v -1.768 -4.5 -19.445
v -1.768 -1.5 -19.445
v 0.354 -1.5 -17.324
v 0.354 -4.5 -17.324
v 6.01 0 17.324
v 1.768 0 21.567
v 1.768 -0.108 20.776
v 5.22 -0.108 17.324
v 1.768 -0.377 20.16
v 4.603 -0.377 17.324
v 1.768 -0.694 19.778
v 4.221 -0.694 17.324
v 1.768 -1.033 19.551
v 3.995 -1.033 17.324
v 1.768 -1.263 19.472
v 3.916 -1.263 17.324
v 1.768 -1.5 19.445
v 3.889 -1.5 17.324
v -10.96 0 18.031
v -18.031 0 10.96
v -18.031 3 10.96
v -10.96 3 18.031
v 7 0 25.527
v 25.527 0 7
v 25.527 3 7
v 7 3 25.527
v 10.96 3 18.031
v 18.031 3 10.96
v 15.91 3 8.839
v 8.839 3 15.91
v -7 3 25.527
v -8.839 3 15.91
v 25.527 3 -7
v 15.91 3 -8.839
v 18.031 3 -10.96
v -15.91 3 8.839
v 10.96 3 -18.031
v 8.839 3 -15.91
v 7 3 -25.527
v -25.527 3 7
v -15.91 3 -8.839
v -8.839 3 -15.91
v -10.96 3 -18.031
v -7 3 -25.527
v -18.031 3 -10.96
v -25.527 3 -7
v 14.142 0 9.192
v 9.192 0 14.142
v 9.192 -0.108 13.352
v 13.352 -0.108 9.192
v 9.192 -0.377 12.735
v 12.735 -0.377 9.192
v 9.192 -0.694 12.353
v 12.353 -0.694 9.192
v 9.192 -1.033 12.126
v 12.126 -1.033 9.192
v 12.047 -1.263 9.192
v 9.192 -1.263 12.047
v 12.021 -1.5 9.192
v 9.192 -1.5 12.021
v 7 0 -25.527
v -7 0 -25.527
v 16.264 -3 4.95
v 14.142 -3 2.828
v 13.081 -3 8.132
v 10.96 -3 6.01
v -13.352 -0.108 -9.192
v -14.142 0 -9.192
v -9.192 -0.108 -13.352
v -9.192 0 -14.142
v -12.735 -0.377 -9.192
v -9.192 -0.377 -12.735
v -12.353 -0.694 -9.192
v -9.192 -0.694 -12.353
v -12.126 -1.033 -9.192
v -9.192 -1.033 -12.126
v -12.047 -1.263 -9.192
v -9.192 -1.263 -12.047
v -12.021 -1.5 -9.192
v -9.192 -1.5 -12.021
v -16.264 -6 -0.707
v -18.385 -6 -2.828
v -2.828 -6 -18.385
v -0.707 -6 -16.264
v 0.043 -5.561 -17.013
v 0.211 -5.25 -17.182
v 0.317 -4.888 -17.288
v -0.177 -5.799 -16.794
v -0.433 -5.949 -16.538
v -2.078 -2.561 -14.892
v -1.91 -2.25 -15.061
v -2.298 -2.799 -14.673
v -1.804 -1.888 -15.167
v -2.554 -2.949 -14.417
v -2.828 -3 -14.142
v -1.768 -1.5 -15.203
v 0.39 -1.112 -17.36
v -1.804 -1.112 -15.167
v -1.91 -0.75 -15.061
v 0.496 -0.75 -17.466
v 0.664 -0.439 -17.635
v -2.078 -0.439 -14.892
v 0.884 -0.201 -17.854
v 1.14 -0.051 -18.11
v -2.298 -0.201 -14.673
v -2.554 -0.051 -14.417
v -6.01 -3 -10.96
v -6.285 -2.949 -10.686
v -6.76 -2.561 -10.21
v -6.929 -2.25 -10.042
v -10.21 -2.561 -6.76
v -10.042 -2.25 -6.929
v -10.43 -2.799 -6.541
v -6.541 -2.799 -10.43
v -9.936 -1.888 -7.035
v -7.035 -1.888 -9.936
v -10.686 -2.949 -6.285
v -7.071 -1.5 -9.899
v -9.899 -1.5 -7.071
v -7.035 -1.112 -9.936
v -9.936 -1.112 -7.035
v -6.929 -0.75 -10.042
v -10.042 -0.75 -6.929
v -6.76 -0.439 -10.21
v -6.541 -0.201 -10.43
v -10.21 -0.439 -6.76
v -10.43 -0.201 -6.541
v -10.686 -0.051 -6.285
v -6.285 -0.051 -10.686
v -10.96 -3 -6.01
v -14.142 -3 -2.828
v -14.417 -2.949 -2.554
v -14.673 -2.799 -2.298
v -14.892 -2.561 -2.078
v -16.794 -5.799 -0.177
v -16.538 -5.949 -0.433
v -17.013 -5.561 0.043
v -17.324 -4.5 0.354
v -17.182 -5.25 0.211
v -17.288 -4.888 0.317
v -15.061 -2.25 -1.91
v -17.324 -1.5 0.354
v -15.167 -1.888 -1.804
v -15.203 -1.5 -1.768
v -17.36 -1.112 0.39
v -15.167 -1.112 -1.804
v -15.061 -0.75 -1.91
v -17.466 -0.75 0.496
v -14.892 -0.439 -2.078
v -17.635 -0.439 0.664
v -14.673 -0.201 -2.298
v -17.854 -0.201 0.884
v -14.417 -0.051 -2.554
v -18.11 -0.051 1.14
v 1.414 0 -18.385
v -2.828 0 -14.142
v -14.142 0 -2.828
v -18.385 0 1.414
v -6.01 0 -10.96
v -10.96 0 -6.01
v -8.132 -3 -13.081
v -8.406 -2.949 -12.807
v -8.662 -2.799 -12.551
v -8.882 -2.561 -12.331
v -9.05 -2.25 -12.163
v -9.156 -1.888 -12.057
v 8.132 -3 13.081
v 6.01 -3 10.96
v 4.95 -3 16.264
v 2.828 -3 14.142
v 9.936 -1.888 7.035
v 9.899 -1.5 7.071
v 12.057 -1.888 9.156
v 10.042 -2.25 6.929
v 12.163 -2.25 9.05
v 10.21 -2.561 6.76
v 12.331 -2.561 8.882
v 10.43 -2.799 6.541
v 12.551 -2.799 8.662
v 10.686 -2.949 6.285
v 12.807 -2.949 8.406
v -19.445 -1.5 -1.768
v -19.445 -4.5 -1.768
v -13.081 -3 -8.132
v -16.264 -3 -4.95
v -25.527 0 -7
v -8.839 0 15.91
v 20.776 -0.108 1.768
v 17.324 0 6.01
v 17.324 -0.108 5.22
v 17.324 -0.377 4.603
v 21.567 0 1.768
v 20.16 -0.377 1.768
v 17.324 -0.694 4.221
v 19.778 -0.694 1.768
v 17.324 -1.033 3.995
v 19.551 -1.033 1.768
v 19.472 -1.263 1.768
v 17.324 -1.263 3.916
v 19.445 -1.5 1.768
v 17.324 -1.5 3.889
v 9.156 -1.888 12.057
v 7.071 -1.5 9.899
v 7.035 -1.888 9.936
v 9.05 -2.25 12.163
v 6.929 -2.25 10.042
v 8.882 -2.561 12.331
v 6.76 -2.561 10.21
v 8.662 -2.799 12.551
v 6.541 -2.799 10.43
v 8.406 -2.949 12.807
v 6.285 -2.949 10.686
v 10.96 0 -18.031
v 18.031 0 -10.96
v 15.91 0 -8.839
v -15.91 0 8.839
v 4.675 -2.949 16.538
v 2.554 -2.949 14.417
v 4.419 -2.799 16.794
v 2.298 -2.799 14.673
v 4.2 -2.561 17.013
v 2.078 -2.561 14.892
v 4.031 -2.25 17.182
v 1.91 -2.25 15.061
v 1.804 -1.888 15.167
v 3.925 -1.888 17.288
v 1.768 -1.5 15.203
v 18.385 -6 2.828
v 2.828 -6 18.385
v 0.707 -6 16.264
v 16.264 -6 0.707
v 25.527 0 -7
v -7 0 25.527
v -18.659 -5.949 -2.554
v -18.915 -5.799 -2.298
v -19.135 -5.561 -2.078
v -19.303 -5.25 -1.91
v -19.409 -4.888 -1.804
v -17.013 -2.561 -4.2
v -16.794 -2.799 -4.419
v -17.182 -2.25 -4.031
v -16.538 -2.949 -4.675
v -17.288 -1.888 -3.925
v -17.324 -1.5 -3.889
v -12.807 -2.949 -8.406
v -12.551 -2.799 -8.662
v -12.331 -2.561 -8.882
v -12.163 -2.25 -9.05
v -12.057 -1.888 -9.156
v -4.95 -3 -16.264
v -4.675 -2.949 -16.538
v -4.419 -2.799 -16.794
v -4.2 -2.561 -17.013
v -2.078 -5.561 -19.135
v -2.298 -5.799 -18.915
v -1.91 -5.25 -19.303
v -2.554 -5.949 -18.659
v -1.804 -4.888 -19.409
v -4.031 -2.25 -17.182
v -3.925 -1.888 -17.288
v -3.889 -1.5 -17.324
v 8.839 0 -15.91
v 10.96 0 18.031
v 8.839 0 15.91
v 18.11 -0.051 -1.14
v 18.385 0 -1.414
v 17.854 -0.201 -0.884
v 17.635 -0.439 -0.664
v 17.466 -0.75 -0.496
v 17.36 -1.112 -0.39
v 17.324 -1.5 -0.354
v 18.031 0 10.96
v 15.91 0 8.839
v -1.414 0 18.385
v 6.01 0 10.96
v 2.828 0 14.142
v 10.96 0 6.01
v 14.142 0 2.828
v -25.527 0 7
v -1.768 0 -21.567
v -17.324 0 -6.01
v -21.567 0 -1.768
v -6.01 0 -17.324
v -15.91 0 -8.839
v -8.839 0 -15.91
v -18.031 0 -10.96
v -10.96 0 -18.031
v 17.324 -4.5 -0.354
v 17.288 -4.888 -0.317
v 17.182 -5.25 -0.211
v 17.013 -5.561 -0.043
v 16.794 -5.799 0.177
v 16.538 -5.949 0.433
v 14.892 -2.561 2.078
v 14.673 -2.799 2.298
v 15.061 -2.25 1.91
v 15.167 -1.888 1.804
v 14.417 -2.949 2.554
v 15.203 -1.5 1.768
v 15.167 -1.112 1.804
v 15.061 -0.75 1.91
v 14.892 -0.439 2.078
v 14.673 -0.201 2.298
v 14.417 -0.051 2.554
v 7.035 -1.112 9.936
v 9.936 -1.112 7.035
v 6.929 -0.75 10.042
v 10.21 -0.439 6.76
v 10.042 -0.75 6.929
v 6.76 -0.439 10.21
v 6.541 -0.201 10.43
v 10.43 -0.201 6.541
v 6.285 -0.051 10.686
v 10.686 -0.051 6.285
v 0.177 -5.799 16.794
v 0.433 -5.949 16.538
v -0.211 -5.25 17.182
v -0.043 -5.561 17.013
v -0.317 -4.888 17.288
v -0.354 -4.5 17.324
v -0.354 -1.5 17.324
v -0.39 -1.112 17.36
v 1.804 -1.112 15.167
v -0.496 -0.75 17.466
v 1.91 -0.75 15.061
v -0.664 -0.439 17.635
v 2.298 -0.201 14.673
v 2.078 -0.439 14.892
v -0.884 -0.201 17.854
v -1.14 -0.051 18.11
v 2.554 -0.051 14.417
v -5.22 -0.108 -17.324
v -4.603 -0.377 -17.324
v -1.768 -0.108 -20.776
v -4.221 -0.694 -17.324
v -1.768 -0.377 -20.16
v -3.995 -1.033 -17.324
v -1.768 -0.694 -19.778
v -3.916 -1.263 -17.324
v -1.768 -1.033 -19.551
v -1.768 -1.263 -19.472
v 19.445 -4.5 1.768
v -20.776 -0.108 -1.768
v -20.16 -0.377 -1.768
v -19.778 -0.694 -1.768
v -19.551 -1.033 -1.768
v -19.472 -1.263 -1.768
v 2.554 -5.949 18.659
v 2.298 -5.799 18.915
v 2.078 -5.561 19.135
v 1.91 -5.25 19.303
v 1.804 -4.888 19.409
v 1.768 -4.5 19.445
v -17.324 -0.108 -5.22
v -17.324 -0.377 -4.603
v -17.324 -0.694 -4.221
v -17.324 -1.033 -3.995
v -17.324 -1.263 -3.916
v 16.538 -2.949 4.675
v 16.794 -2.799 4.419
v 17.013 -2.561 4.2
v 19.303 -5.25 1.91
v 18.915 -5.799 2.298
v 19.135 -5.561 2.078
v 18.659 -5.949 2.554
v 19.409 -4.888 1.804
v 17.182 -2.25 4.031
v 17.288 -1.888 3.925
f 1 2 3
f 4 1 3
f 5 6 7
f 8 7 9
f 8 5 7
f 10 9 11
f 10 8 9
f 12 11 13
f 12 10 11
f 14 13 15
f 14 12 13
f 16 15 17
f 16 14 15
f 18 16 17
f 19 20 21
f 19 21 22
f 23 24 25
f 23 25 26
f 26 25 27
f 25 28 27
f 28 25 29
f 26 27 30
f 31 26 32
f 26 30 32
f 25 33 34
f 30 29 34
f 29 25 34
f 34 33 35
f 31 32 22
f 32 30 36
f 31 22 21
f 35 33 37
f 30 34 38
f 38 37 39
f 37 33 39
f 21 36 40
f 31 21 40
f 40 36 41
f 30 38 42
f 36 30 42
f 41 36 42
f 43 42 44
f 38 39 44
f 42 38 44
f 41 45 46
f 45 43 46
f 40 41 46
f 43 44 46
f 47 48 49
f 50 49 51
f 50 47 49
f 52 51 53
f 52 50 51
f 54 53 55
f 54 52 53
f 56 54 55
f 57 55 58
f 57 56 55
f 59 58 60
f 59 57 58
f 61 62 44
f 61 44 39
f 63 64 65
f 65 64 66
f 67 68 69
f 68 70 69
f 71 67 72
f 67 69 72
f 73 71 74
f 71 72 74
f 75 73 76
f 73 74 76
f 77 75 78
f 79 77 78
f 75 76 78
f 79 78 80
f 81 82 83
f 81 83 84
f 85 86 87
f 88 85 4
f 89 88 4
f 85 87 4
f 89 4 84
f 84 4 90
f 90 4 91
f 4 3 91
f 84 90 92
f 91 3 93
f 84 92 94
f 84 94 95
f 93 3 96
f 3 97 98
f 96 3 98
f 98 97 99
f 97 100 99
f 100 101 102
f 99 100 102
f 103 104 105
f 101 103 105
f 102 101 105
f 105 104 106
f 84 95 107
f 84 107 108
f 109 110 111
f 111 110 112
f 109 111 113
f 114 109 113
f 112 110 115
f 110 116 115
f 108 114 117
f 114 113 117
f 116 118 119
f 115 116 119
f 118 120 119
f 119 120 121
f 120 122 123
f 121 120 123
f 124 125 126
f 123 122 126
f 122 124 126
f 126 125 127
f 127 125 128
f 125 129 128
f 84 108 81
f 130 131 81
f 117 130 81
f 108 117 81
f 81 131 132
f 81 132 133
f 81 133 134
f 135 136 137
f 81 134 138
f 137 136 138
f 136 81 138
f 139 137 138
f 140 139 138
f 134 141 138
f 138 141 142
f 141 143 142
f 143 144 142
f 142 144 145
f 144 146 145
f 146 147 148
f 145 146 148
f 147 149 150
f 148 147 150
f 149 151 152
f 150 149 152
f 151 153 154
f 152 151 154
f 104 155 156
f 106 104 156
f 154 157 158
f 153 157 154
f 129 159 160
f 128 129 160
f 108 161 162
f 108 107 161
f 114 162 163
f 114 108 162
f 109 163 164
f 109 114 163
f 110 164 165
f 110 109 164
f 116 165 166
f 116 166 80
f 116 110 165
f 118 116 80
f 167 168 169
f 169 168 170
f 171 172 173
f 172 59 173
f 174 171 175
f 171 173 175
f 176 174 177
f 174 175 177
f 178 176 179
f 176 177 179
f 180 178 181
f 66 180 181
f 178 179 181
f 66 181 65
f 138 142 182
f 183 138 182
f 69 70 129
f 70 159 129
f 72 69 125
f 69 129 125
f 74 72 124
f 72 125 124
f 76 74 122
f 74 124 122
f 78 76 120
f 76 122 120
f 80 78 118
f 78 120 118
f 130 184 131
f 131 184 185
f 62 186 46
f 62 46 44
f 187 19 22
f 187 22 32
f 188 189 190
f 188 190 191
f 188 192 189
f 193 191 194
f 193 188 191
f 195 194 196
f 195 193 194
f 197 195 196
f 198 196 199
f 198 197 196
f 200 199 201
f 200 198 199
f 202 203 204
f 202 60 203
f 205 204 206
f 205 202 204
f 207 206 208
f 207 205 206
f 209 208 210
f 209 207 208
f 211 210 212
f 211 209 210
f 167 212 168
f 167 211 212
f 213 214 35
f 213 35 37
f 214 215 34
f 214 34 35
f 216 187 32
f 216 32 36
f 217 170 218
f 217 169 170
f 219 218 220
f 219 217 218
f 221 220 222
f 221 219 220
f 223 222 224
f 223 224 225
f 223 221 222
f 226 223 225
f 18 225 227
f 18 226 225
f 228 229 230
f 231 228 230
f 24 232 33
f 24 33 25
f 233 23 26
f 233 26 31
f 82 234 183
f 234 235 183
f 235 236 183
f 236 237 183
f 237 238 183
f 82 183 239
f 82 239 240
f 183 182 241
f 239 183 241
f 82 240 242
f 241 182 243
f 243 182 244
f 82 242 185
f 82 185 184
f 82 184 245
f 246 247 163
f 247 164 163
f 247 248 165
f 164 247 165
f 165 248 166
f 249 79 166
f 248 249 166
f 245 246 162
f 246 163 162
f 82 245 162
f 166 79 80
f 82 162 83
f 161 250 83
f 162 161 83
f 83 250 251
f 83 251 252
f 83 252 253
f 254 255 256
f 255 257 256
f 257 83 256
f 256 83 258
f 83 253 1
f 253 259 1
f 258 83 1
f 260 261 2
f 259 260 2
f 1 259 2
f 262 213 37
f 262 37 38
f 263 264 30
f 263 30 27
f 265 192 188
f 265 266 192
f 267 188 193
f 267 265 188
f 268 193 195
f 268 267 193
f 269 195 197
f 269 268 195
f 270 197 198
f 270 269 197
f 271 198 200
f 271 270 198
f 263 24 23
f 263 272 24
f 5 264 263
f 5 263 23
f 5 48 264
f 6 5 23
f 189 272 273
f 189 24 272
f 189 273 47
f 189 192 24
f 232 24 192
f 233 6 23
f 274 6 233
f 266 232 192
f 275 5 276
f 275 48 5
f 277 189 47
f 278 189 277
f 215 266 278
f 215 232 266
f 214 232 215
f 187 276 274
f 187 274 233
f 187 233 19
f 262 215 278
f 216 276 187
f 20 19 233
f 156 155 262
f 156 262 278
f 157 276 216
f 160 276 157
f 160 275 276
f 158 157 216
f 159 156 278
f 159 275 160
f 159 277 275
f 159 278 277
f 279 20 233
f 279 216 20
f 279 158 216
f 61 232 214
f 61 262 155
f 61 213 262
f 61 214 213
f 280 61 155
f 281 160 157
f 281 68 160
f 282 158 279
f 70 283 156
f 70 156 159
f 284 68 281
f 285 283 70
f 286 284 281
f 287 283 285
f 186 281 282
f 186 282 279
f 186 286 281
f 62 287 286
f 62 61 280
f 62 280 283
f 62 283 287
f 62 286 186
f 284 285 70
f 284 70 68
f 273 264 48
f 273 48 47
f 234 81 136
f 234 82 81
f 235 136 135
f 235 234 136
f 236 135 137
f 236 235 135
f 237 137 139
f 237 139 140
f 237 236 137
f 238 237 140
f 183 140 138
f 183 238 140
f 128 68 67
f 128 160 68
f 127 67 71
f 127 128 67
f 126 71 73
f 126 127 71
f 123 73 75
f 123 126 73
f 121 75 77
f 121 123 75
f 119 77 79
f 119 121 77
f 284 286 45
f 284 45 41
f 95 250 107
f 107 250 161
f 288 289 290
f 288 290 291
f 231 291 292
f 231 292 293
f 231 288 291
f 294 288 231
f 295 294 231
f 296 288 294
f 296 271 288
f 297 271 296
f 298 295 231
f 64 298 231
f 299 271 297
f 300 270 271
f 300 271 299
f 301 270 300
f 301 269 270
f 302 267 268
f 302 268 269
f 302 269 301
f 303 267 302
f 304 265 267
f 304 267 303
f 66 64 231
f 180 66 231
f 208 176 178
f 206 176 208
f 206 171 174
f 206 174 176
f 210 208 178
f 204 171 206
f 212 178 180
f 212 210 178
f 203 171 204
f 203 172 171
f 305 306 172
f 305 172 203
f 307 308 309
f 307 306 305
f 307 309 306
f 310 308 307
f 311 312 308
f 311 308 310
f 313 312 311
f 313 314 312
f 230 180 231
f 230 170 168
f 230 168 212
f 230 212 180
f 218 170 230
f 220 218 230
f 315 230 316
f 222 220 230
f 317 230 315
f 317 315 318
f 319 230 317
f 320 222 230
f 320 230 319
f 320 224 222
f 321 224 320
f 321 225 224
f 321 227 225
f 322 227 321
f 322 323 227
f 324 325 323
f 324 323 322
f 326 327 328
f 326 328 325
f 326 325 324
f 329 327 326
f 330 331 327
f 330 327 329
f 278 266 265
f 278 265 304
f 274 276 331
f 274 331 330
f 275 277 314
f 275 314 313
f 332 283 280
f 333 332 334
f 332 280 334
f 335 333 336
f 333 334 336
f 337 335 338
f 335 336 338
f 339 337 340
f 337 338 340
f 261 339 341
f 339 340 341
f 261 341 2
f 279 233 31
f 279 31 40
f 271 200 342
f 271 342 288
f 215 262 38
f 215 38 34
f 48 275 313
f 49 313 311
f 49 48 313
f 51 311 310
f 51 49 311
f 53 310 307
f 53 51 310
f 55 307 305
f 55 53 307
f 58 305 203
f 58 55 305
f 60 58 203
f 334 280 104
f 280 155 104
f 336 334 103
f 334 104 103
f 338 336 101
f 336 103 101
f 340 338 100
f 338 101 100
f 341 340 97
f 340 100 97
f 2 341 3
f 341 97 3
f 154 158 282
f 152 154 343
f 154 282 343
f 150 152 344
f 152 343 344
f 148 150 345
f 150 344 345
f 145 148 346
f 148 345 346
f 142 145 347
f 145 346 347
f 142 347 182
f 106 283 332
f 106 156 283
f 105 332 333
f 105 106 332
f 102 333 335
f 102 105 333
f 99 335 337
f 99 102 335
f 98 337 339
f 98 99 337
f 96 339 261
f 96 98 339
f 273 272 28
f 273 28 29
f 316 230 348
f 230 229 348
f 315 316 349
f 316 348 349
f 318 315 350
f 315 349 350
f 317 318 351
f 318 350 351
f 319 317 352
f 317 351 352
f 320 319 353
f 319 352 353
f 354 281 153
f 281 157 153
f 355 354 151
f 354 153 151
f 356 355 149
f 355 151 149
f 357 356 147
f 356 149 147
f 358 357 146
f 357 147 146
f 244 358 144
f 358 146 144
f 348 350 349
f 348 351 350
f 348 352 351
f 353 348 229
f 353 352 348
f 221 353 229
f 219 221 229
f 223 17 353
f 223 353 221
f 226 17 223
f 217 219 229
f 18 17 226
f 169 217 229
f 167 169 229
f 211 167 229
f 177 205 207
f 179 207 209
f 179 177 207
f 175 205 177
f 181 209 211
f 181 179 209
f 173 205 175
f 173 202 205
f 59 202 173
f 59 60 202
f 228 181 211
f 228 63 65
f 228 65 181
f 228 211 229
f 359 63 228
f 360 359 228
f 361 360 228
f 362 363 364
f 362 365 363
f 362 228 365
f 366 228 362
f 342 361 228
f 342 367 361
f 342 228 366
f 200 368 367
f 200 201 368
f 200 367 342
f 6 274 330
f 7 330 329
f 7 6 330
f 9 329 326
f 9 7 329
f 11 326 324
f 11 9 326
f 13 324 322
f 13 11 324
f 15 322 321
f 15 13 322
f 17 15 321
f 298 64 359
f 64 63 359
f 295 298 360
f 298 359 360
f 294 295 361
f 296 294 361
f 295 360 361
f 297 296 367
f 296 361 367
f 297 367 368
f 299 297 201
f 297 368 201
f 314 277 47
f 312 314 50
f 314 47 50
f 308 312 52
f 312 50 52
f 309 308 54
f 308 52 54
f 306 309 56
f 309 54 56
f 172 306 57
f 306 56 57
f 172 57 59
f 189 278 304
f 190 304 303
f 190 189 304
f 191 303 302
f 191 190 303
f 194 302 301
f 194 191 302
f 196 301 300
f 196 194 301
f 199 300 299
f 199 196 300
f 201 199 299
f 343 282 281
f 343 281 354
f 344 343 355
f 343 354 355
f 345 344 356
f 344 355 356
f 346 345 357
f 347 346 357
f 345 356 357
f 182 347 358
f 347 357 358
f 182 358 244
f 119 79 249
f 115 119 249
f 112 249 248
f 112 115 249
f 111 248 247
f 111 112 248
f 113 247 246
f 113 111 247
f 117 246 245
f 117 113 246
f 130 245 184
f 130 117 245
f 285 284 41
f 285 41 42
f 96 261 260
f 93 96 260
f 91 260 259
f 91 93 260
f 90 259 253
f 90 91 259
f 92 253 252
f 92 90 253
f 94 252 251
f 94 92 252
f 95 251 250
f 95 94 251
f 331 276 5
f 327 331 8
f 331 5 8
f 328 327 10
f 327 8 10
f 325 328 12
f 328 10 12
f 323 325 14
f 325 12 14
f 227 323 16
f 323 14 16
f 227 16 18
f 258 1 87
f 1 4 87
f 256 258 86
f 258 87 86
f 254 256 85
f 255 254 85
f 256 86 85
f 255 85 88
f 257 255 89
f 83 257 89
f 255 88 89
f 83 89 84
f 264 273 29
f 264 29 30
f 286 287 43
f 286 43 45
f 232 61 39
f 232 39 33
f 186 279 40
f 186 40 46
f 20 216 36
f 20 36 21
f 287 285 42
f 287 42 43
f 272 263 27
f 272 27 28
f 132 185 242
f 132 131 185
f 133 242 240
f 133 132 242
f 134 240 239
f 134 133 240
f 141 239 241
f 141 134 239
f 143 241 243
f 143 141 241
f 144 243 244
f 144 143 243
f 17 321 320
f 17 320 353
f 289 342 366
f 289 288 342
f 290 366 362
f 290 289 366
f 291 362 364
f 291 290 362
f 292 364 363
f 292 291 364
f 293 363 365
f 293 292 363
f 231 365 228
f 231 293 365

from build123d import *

# Parameters (mm, degrees)
MAIN_PLATE_DEPTH                 = 3
TOP_PLATE_CONNECTOR_HOLES_DEPTH  = 37.224942593
ZIPTIE_STRUCTURE_DEPTH           = 6
SKETCH5_W                        = 7.5
SKETCH5_H                        = 3
ZIPTIE_HOLES_DEPTH               = 52.45154631
REMOVING_STRESS_CONCENTRATIONS_R = 1.5


with BuildPart() as part:
    # Sketch1 → Main Plate (new body)
    with BuildSketch(Plane(origin=(0, 0, 0), x_dir=(1, 0, 0), z_dir=(0, 1, 0))):
        Polygon((-7, 25.526911935), (7, 25.526911935), (25.526911935, 7), (25.526911935, -7), (7, -25.526911935), (-7, -25.526911935), (-25.526911935, -7), (-25.526911935, 7), align=None)
    extrude(amount=MAIN_PLATE_DEPTH)

    # Sketch2 → Top Plate Connector Holes (cut, through all)
    with BuildSketch(Plane.XZ):
        Polygon((10.960155108, 18.03122292), (18.03122292, 10.960155108), (15.909902577, 8.838834765), (8.838834765, 15.909902577), align=None)
        Polygon((8.838834765, -15.909902577), (15.909902577, -8.838834765), (18.03122292, -10.960155108), (10.960155108, -18.03122292), align=None)
        Polygon((-15.909902577, -8.838834765), (-8.838834765, -15.909902577), (-10.960155108, -18.03122292), (-18.03122292, -10.960155108), align=None)
        Polygon((-8.838834765, 15.909902577), (-15.909902577, 8.838834765), (-18.03122292, 10.960155108), (-10.960155108, 18.03122292), align=None)
    extrude(amount=-TOP_PLATE_CONNECTOR_HOLES_DEPTH, mode=Mode.SUBTRACT)

    # Sketch3 → ZipTie Structure (add)
    with BuildSketch(Plane.XZ):
        Polygon((1.767766953, 19.445436483), (19.445436483, 1.767766953), (17.324116139, -0.353553391), (-0.353553391, 17.324116139), align=None)
        Polygon((-1.767766953, -19.445436483), (0.353553391, -17.324116139), (-17.324116139, 0.353553391), (-19.445436483, -1.767766953), align=None)
    extrude(amount=ZIPTIE_STRUCTURE_DEPTH)

    # Sketch5 → ZipTie Holes (cut, through all)
    with BuildSketch(Plane(origin=(-10.606601718, 0, -10.606601718), x_dir=(-0.7071067811865475, 0, 0.7071067811865477), z_dir=(-0.7071067811865477, 0, -0.7071067811865475))):
        with Locations((-5.75, -1.5)):
            Rectangle(SKETCH5_W, SKETCH5_H)
        with Locations((5.75, -1.5)):
            Rectangle(SKETCH5_W, SKETCH5_H)
    extrude(amount=-ZIPTIE_HOLES_DEPTH, mode=Mode.SUBTRACT)

    # Removing Stress Concentrations
    removing_stress_concentrations_edges = [part.edges().sort_by_distance(p)[0] for p in [
        (8.131727984, -3, 10.960155108),
        (10.960155108, -3, 8.131727984),
        (16.263455967, -3, 2.828427125),
        (-2.828427125, -3, -16.263455967),
        (-8.131727984, -3, -10.960155108),
        (-10.960155108, -3, -8.131727984),
        (-16.263455967, -3, -2.828427125),
        (2.828427125, -3, 16.263455967),
        (-16.263455967, 0, -2.828427125),
        (-8.131727984, 0, -10.960155108),
        (-0.707106781, 0, -18.384776311),
        (2.828427125, 0, 18.384776311),
        (10.606601718, 0, 10.606601718),
        (18.384776311, 0, 2.828427125),
        (10.960155108, 0, 8.131727984),
        (2.828427125, 0, 16.263455967),
        (0.707106781, -6, 18.384776311),
        (18.384776311, -6, 0.707106781),
        (18.384776311, 0, 0.707106781),
        (16.263455967, 0, 2.828427125),
        (0.707106781, 0, 18.384776311),
        (8.131727984, 0, 10.960155108),
        (-18.384776311, 0, -0.707106781),
        (-2.828427125, 0, -16.263455967),
        (-10.960155108, 0, -8.131727984),
        (-2.828427125, 0, -18.384776311),
        (-10.606601718, 0, -10.606601718),
        (-18.384776311, 0, -2.828427125),
        (-18.384776311, -6, -0.707106781),
        (-0.707106781, -6, -18.384776311),
    ]]
    fillet(removing_stress_concentrations_edges, radius=REMOVING_STRESS_CONCENTRATIONS_R - 0.0001)  # a hair under: the kernel refuses the full size


solid = part.part
